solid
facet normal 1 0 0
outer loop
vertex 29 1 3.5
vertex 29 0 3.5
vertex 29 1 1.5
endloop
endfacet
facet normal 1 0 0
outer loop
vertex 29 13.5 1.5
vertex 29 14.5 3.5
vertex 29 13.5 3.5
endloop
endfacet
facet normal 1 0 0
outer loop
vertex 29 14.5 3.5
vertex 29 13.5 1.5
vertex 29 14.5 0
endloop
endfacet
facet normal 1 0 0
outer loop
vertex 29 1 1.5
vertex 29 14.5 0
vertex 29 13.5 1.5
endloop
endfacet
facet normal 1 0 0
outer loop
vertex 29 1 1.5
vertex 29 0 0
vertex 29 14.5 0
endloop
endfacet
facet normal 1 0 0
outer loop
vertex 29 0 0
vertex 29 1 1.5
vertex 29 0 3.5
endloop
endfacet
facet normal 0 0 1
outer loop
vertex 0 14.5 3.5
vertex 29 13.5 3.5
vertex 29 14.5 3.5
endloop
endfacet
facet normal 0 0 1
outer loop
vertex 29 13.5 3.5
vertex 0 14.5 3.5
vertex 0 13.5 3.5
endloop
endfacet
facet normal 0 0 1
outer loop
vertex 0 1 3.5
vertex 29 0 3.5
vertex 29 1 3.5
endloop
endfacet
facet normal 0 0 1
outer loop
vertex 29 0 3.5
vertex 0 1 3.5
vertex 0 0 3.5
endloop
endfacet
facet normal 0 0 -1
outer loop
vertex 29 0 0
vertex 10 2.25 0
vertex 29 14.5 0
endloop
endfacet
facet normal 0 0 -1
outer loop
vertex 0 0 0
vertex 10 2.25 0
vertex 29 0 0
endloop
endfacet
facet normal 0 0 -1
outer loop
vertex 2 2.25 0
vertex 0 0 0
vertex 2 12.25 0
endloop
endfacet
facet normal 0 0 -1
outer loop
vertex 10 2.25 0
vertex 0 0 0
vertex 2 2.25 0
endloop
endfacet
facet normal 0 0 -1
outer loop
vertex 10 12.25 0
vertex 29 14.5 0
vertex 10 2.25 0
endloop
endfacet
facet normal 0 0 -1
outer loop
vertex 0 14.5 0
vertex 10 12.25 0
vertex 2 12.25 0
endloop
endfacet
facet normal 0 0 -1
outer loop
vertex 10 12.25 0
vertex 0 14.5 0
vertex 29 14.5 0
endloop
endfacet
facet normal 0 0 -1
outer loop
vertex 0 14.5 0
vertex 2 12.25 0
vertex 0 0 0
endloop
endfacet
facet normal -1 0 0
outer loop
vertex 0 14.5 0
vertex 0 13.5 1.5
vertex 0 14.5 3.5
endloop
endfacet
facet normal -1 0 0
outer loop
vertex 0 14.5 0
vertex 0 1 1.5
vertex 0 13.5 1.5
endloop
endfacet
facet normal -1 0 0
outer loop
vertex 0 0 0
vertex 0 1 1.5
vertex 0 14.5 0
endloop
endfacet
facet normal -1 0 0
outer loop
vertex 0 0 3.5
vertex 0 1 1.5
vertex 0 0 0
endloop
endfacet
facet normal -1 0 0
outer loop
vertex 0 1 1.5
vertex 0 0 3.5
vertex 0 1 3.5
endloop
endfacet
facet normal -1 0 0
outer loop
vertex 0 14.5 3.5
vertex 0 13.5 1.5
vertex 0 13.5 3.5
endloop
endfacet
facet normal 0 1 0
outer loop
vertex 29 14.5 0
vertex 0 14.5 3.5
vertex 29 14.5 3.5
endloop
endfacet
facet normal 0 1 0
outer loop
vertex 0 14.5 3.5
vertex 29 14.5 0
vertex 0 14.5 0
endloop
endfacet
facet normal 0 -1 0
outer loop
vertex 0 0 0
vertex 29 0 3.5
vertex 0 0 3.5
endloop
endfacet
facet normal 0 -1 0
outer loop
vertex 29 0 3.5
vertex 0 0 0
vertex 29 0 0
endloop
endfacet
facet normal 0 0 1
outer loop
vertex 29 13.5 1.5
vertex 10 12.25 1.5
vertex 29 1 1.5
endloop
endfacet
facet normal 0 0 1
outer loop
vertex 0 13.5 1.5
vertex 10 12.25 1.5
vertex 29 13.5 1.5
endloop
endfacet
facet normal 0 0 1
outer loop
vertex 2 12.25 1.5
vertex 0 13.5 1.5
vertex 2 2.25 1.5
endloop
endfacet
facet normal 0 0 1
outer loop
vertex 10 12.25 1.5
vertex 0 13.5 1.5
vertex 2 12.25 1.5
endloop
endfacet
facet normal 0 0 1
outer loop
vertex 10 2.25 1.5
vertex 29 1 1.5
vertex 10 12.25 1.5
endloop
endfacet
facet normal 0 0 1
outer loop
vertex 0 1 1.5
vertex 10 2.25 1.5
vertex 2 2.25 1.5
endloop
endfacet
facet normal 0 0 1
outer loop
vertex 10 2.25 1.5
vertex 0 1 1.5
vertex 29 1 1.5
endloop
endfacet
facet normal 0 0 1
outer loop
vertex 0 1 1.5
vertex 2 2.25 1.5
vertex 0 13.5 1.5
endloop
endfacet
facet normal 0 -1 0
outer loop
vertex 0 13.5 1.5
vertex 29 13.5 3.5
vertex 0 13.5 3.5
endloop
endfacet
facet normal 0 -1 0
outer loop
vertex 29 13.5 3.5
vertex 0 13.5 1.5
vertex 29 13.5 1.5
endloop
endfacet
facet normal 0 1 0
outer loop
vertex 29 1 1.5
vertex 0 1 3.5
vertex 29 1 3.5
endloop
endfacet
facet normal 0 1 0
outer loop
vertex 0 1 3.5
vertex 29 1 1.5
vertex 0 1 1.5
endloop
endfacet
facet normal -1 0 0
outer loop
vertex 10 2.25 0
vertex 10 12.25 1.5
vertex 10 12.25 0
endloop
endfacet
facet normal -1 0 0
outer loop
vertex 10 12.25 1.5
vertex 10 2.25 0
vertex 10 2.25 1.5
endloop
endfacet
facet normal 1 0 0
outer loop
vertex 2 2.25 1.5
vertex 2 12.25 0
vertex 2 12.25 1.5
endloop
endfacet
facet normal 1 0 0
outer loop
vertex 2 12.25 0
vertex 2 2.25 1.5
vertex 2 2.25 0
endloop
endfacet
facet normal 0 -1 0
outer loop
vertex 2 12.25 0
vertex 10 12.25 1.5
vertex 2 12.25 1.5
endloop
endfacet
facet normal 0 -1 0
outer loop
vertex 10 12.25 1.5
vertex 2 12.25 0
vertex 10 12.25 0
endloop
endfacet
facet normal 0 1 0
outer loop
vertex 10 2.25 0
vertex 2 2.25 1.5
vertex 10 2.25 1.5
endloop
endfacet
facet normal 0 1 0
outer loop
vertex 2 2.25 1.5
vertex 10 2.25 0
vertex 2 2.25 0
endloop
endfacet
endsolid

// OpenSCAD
module cable_fix()
{
  difference()
  {
    // main block
    cube([15+14, 11.5+1+2*1, 1.5+2]);
    // main cut
    translate([0, 1, 1.5])
      cube([15+14, 11.5+1, 1.5+2]);
    // cut for center elements
    translate([2, (11.5+1+2*1)/2 - 10/2, 0])
      cube([14-4-2, 10, 1.5]);
  }
}


cable_fix();
